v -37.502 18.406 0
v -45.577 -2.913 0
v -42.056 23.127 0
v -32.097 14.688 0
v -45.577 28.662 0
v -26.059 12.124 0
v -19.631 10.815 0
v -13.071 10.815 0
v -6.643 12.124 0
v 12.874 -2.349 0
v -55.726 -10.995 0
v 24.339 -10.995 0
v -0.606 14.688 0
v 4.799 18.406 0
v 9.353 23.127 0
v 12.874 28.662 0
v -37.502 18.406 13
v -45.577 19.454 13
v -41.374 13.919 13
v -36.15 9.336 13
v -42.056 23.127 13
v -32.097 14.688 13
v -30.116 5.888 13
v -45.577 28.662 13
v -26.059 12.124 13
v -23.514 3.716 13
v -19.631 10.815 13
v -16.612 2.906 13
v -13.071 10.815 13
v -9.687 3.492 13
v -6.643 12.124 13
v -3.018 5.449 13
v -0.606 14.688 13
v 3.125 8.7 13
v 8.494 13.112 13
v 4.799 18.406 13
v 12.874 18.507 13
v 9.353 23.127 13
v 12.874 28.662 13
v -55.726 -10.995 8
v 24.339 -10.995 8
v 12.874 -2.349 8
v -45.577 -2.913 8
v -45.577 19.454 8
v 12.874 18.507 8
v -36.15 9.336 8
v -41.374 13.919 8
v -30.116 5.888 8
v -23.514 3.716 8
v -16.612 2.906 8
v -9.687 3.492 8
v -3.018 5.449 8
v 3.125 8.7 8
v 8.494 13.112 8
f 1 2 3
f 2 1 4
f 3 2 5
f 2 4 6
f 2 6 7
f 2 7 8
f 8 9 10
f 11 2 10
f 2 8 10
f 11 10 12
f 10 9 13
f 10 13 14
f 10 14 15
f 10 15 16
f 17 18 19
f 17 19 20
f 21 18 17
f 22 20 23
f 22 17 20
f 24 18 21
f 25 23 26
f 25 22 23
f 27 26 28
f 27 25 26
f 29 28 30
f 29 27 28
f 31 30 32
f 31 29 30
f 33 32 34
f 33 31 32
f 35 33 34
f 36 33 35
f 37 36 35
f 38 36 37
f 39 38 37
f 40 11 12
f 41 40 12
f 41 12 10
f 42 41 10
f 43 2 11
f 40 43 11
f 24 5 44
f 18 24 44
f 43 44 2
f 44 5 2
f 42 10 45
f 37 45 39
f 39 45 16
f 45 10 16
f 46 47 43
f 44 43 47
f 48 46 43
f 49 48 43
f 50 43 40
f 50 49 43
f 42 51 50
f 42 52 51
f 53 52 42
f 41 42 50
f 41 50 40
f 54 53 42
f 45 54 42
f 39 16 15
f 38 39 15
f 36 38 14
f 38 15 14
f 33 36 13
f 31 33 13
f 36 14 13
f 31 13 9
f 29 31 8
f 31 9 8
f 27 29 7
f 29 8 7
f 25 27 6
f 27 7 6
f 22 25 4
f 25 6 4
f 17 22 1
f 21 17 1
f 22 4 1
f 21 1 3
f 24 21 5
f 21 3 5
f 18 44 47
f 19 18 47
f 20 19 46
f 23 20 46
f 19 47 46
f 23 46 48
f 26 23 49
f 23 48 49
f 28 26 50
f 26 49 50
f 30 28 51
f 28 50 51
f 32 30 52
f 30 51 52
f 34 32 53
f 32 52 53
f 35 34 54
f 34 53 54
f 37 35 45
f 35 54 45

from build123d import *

# Parameters (mm, degrees)
F1_DEPTH      = 8
F3_DEPTH      = 25
F3_DEPTH_BACK = 25
F5_DEPTH      = 5


with BuildPart() as f1:
    # F0 (on Top) → F1 (new body)
    with BuildSketch(Plane.XY):
        Polygon((-45.577269, 28.661994), (-45.577269, -2.913186), (-55.726435, -10.994929), (24.339201, -10.994929), (12.874405, -2.349344), (12.874405, 28.661994), align=None)
    extrude(amount=F1_DEPTH)

    # F2 (on face) → F3 (cut, two sides)
    with BuildSketch(Plane(origin=(0, 0, 0), x_dir=(1, 0, 0), z_dir=(0, 0, -1))) as f3_sk:
        with BuildLine():
            Line((-45.577269, -28.661994), (12.874405, -28.661994))
            ThreePointArc((12.874405, -28.661994), (-16.351432, -10.650162), (-45.577269, -28.661994))
        make_face()
    extrude(amount=-F3_DEPTH, mode=Mode.SUBTRACT)
    extrude(f3_sk.sketch, amount=-F3_DEPTH_BACK, mode=Mode.SUBTRACT)

    # F4 (on face) → F5 (join)
    with BuildSketch(Plane.XY.offset(8)):
        with BuildLine():
            Line((-45.577269, 28.661994), (-45.577269, 19.454254))
            ThreePointArc((-45.577269, 19.454254), (-16.611798, 2.906171), (12.874405, 18.507497))
            Line((12.874405, 18.507497), (12.874405, 28.661994))
            ThreePointArc((12.874405, 28.661994), (-16.351432, 10.650162), (-45.577269, 28.661994))
        make_face()
    extrude(amount=F5_DEPTH)


solid = f1.part
